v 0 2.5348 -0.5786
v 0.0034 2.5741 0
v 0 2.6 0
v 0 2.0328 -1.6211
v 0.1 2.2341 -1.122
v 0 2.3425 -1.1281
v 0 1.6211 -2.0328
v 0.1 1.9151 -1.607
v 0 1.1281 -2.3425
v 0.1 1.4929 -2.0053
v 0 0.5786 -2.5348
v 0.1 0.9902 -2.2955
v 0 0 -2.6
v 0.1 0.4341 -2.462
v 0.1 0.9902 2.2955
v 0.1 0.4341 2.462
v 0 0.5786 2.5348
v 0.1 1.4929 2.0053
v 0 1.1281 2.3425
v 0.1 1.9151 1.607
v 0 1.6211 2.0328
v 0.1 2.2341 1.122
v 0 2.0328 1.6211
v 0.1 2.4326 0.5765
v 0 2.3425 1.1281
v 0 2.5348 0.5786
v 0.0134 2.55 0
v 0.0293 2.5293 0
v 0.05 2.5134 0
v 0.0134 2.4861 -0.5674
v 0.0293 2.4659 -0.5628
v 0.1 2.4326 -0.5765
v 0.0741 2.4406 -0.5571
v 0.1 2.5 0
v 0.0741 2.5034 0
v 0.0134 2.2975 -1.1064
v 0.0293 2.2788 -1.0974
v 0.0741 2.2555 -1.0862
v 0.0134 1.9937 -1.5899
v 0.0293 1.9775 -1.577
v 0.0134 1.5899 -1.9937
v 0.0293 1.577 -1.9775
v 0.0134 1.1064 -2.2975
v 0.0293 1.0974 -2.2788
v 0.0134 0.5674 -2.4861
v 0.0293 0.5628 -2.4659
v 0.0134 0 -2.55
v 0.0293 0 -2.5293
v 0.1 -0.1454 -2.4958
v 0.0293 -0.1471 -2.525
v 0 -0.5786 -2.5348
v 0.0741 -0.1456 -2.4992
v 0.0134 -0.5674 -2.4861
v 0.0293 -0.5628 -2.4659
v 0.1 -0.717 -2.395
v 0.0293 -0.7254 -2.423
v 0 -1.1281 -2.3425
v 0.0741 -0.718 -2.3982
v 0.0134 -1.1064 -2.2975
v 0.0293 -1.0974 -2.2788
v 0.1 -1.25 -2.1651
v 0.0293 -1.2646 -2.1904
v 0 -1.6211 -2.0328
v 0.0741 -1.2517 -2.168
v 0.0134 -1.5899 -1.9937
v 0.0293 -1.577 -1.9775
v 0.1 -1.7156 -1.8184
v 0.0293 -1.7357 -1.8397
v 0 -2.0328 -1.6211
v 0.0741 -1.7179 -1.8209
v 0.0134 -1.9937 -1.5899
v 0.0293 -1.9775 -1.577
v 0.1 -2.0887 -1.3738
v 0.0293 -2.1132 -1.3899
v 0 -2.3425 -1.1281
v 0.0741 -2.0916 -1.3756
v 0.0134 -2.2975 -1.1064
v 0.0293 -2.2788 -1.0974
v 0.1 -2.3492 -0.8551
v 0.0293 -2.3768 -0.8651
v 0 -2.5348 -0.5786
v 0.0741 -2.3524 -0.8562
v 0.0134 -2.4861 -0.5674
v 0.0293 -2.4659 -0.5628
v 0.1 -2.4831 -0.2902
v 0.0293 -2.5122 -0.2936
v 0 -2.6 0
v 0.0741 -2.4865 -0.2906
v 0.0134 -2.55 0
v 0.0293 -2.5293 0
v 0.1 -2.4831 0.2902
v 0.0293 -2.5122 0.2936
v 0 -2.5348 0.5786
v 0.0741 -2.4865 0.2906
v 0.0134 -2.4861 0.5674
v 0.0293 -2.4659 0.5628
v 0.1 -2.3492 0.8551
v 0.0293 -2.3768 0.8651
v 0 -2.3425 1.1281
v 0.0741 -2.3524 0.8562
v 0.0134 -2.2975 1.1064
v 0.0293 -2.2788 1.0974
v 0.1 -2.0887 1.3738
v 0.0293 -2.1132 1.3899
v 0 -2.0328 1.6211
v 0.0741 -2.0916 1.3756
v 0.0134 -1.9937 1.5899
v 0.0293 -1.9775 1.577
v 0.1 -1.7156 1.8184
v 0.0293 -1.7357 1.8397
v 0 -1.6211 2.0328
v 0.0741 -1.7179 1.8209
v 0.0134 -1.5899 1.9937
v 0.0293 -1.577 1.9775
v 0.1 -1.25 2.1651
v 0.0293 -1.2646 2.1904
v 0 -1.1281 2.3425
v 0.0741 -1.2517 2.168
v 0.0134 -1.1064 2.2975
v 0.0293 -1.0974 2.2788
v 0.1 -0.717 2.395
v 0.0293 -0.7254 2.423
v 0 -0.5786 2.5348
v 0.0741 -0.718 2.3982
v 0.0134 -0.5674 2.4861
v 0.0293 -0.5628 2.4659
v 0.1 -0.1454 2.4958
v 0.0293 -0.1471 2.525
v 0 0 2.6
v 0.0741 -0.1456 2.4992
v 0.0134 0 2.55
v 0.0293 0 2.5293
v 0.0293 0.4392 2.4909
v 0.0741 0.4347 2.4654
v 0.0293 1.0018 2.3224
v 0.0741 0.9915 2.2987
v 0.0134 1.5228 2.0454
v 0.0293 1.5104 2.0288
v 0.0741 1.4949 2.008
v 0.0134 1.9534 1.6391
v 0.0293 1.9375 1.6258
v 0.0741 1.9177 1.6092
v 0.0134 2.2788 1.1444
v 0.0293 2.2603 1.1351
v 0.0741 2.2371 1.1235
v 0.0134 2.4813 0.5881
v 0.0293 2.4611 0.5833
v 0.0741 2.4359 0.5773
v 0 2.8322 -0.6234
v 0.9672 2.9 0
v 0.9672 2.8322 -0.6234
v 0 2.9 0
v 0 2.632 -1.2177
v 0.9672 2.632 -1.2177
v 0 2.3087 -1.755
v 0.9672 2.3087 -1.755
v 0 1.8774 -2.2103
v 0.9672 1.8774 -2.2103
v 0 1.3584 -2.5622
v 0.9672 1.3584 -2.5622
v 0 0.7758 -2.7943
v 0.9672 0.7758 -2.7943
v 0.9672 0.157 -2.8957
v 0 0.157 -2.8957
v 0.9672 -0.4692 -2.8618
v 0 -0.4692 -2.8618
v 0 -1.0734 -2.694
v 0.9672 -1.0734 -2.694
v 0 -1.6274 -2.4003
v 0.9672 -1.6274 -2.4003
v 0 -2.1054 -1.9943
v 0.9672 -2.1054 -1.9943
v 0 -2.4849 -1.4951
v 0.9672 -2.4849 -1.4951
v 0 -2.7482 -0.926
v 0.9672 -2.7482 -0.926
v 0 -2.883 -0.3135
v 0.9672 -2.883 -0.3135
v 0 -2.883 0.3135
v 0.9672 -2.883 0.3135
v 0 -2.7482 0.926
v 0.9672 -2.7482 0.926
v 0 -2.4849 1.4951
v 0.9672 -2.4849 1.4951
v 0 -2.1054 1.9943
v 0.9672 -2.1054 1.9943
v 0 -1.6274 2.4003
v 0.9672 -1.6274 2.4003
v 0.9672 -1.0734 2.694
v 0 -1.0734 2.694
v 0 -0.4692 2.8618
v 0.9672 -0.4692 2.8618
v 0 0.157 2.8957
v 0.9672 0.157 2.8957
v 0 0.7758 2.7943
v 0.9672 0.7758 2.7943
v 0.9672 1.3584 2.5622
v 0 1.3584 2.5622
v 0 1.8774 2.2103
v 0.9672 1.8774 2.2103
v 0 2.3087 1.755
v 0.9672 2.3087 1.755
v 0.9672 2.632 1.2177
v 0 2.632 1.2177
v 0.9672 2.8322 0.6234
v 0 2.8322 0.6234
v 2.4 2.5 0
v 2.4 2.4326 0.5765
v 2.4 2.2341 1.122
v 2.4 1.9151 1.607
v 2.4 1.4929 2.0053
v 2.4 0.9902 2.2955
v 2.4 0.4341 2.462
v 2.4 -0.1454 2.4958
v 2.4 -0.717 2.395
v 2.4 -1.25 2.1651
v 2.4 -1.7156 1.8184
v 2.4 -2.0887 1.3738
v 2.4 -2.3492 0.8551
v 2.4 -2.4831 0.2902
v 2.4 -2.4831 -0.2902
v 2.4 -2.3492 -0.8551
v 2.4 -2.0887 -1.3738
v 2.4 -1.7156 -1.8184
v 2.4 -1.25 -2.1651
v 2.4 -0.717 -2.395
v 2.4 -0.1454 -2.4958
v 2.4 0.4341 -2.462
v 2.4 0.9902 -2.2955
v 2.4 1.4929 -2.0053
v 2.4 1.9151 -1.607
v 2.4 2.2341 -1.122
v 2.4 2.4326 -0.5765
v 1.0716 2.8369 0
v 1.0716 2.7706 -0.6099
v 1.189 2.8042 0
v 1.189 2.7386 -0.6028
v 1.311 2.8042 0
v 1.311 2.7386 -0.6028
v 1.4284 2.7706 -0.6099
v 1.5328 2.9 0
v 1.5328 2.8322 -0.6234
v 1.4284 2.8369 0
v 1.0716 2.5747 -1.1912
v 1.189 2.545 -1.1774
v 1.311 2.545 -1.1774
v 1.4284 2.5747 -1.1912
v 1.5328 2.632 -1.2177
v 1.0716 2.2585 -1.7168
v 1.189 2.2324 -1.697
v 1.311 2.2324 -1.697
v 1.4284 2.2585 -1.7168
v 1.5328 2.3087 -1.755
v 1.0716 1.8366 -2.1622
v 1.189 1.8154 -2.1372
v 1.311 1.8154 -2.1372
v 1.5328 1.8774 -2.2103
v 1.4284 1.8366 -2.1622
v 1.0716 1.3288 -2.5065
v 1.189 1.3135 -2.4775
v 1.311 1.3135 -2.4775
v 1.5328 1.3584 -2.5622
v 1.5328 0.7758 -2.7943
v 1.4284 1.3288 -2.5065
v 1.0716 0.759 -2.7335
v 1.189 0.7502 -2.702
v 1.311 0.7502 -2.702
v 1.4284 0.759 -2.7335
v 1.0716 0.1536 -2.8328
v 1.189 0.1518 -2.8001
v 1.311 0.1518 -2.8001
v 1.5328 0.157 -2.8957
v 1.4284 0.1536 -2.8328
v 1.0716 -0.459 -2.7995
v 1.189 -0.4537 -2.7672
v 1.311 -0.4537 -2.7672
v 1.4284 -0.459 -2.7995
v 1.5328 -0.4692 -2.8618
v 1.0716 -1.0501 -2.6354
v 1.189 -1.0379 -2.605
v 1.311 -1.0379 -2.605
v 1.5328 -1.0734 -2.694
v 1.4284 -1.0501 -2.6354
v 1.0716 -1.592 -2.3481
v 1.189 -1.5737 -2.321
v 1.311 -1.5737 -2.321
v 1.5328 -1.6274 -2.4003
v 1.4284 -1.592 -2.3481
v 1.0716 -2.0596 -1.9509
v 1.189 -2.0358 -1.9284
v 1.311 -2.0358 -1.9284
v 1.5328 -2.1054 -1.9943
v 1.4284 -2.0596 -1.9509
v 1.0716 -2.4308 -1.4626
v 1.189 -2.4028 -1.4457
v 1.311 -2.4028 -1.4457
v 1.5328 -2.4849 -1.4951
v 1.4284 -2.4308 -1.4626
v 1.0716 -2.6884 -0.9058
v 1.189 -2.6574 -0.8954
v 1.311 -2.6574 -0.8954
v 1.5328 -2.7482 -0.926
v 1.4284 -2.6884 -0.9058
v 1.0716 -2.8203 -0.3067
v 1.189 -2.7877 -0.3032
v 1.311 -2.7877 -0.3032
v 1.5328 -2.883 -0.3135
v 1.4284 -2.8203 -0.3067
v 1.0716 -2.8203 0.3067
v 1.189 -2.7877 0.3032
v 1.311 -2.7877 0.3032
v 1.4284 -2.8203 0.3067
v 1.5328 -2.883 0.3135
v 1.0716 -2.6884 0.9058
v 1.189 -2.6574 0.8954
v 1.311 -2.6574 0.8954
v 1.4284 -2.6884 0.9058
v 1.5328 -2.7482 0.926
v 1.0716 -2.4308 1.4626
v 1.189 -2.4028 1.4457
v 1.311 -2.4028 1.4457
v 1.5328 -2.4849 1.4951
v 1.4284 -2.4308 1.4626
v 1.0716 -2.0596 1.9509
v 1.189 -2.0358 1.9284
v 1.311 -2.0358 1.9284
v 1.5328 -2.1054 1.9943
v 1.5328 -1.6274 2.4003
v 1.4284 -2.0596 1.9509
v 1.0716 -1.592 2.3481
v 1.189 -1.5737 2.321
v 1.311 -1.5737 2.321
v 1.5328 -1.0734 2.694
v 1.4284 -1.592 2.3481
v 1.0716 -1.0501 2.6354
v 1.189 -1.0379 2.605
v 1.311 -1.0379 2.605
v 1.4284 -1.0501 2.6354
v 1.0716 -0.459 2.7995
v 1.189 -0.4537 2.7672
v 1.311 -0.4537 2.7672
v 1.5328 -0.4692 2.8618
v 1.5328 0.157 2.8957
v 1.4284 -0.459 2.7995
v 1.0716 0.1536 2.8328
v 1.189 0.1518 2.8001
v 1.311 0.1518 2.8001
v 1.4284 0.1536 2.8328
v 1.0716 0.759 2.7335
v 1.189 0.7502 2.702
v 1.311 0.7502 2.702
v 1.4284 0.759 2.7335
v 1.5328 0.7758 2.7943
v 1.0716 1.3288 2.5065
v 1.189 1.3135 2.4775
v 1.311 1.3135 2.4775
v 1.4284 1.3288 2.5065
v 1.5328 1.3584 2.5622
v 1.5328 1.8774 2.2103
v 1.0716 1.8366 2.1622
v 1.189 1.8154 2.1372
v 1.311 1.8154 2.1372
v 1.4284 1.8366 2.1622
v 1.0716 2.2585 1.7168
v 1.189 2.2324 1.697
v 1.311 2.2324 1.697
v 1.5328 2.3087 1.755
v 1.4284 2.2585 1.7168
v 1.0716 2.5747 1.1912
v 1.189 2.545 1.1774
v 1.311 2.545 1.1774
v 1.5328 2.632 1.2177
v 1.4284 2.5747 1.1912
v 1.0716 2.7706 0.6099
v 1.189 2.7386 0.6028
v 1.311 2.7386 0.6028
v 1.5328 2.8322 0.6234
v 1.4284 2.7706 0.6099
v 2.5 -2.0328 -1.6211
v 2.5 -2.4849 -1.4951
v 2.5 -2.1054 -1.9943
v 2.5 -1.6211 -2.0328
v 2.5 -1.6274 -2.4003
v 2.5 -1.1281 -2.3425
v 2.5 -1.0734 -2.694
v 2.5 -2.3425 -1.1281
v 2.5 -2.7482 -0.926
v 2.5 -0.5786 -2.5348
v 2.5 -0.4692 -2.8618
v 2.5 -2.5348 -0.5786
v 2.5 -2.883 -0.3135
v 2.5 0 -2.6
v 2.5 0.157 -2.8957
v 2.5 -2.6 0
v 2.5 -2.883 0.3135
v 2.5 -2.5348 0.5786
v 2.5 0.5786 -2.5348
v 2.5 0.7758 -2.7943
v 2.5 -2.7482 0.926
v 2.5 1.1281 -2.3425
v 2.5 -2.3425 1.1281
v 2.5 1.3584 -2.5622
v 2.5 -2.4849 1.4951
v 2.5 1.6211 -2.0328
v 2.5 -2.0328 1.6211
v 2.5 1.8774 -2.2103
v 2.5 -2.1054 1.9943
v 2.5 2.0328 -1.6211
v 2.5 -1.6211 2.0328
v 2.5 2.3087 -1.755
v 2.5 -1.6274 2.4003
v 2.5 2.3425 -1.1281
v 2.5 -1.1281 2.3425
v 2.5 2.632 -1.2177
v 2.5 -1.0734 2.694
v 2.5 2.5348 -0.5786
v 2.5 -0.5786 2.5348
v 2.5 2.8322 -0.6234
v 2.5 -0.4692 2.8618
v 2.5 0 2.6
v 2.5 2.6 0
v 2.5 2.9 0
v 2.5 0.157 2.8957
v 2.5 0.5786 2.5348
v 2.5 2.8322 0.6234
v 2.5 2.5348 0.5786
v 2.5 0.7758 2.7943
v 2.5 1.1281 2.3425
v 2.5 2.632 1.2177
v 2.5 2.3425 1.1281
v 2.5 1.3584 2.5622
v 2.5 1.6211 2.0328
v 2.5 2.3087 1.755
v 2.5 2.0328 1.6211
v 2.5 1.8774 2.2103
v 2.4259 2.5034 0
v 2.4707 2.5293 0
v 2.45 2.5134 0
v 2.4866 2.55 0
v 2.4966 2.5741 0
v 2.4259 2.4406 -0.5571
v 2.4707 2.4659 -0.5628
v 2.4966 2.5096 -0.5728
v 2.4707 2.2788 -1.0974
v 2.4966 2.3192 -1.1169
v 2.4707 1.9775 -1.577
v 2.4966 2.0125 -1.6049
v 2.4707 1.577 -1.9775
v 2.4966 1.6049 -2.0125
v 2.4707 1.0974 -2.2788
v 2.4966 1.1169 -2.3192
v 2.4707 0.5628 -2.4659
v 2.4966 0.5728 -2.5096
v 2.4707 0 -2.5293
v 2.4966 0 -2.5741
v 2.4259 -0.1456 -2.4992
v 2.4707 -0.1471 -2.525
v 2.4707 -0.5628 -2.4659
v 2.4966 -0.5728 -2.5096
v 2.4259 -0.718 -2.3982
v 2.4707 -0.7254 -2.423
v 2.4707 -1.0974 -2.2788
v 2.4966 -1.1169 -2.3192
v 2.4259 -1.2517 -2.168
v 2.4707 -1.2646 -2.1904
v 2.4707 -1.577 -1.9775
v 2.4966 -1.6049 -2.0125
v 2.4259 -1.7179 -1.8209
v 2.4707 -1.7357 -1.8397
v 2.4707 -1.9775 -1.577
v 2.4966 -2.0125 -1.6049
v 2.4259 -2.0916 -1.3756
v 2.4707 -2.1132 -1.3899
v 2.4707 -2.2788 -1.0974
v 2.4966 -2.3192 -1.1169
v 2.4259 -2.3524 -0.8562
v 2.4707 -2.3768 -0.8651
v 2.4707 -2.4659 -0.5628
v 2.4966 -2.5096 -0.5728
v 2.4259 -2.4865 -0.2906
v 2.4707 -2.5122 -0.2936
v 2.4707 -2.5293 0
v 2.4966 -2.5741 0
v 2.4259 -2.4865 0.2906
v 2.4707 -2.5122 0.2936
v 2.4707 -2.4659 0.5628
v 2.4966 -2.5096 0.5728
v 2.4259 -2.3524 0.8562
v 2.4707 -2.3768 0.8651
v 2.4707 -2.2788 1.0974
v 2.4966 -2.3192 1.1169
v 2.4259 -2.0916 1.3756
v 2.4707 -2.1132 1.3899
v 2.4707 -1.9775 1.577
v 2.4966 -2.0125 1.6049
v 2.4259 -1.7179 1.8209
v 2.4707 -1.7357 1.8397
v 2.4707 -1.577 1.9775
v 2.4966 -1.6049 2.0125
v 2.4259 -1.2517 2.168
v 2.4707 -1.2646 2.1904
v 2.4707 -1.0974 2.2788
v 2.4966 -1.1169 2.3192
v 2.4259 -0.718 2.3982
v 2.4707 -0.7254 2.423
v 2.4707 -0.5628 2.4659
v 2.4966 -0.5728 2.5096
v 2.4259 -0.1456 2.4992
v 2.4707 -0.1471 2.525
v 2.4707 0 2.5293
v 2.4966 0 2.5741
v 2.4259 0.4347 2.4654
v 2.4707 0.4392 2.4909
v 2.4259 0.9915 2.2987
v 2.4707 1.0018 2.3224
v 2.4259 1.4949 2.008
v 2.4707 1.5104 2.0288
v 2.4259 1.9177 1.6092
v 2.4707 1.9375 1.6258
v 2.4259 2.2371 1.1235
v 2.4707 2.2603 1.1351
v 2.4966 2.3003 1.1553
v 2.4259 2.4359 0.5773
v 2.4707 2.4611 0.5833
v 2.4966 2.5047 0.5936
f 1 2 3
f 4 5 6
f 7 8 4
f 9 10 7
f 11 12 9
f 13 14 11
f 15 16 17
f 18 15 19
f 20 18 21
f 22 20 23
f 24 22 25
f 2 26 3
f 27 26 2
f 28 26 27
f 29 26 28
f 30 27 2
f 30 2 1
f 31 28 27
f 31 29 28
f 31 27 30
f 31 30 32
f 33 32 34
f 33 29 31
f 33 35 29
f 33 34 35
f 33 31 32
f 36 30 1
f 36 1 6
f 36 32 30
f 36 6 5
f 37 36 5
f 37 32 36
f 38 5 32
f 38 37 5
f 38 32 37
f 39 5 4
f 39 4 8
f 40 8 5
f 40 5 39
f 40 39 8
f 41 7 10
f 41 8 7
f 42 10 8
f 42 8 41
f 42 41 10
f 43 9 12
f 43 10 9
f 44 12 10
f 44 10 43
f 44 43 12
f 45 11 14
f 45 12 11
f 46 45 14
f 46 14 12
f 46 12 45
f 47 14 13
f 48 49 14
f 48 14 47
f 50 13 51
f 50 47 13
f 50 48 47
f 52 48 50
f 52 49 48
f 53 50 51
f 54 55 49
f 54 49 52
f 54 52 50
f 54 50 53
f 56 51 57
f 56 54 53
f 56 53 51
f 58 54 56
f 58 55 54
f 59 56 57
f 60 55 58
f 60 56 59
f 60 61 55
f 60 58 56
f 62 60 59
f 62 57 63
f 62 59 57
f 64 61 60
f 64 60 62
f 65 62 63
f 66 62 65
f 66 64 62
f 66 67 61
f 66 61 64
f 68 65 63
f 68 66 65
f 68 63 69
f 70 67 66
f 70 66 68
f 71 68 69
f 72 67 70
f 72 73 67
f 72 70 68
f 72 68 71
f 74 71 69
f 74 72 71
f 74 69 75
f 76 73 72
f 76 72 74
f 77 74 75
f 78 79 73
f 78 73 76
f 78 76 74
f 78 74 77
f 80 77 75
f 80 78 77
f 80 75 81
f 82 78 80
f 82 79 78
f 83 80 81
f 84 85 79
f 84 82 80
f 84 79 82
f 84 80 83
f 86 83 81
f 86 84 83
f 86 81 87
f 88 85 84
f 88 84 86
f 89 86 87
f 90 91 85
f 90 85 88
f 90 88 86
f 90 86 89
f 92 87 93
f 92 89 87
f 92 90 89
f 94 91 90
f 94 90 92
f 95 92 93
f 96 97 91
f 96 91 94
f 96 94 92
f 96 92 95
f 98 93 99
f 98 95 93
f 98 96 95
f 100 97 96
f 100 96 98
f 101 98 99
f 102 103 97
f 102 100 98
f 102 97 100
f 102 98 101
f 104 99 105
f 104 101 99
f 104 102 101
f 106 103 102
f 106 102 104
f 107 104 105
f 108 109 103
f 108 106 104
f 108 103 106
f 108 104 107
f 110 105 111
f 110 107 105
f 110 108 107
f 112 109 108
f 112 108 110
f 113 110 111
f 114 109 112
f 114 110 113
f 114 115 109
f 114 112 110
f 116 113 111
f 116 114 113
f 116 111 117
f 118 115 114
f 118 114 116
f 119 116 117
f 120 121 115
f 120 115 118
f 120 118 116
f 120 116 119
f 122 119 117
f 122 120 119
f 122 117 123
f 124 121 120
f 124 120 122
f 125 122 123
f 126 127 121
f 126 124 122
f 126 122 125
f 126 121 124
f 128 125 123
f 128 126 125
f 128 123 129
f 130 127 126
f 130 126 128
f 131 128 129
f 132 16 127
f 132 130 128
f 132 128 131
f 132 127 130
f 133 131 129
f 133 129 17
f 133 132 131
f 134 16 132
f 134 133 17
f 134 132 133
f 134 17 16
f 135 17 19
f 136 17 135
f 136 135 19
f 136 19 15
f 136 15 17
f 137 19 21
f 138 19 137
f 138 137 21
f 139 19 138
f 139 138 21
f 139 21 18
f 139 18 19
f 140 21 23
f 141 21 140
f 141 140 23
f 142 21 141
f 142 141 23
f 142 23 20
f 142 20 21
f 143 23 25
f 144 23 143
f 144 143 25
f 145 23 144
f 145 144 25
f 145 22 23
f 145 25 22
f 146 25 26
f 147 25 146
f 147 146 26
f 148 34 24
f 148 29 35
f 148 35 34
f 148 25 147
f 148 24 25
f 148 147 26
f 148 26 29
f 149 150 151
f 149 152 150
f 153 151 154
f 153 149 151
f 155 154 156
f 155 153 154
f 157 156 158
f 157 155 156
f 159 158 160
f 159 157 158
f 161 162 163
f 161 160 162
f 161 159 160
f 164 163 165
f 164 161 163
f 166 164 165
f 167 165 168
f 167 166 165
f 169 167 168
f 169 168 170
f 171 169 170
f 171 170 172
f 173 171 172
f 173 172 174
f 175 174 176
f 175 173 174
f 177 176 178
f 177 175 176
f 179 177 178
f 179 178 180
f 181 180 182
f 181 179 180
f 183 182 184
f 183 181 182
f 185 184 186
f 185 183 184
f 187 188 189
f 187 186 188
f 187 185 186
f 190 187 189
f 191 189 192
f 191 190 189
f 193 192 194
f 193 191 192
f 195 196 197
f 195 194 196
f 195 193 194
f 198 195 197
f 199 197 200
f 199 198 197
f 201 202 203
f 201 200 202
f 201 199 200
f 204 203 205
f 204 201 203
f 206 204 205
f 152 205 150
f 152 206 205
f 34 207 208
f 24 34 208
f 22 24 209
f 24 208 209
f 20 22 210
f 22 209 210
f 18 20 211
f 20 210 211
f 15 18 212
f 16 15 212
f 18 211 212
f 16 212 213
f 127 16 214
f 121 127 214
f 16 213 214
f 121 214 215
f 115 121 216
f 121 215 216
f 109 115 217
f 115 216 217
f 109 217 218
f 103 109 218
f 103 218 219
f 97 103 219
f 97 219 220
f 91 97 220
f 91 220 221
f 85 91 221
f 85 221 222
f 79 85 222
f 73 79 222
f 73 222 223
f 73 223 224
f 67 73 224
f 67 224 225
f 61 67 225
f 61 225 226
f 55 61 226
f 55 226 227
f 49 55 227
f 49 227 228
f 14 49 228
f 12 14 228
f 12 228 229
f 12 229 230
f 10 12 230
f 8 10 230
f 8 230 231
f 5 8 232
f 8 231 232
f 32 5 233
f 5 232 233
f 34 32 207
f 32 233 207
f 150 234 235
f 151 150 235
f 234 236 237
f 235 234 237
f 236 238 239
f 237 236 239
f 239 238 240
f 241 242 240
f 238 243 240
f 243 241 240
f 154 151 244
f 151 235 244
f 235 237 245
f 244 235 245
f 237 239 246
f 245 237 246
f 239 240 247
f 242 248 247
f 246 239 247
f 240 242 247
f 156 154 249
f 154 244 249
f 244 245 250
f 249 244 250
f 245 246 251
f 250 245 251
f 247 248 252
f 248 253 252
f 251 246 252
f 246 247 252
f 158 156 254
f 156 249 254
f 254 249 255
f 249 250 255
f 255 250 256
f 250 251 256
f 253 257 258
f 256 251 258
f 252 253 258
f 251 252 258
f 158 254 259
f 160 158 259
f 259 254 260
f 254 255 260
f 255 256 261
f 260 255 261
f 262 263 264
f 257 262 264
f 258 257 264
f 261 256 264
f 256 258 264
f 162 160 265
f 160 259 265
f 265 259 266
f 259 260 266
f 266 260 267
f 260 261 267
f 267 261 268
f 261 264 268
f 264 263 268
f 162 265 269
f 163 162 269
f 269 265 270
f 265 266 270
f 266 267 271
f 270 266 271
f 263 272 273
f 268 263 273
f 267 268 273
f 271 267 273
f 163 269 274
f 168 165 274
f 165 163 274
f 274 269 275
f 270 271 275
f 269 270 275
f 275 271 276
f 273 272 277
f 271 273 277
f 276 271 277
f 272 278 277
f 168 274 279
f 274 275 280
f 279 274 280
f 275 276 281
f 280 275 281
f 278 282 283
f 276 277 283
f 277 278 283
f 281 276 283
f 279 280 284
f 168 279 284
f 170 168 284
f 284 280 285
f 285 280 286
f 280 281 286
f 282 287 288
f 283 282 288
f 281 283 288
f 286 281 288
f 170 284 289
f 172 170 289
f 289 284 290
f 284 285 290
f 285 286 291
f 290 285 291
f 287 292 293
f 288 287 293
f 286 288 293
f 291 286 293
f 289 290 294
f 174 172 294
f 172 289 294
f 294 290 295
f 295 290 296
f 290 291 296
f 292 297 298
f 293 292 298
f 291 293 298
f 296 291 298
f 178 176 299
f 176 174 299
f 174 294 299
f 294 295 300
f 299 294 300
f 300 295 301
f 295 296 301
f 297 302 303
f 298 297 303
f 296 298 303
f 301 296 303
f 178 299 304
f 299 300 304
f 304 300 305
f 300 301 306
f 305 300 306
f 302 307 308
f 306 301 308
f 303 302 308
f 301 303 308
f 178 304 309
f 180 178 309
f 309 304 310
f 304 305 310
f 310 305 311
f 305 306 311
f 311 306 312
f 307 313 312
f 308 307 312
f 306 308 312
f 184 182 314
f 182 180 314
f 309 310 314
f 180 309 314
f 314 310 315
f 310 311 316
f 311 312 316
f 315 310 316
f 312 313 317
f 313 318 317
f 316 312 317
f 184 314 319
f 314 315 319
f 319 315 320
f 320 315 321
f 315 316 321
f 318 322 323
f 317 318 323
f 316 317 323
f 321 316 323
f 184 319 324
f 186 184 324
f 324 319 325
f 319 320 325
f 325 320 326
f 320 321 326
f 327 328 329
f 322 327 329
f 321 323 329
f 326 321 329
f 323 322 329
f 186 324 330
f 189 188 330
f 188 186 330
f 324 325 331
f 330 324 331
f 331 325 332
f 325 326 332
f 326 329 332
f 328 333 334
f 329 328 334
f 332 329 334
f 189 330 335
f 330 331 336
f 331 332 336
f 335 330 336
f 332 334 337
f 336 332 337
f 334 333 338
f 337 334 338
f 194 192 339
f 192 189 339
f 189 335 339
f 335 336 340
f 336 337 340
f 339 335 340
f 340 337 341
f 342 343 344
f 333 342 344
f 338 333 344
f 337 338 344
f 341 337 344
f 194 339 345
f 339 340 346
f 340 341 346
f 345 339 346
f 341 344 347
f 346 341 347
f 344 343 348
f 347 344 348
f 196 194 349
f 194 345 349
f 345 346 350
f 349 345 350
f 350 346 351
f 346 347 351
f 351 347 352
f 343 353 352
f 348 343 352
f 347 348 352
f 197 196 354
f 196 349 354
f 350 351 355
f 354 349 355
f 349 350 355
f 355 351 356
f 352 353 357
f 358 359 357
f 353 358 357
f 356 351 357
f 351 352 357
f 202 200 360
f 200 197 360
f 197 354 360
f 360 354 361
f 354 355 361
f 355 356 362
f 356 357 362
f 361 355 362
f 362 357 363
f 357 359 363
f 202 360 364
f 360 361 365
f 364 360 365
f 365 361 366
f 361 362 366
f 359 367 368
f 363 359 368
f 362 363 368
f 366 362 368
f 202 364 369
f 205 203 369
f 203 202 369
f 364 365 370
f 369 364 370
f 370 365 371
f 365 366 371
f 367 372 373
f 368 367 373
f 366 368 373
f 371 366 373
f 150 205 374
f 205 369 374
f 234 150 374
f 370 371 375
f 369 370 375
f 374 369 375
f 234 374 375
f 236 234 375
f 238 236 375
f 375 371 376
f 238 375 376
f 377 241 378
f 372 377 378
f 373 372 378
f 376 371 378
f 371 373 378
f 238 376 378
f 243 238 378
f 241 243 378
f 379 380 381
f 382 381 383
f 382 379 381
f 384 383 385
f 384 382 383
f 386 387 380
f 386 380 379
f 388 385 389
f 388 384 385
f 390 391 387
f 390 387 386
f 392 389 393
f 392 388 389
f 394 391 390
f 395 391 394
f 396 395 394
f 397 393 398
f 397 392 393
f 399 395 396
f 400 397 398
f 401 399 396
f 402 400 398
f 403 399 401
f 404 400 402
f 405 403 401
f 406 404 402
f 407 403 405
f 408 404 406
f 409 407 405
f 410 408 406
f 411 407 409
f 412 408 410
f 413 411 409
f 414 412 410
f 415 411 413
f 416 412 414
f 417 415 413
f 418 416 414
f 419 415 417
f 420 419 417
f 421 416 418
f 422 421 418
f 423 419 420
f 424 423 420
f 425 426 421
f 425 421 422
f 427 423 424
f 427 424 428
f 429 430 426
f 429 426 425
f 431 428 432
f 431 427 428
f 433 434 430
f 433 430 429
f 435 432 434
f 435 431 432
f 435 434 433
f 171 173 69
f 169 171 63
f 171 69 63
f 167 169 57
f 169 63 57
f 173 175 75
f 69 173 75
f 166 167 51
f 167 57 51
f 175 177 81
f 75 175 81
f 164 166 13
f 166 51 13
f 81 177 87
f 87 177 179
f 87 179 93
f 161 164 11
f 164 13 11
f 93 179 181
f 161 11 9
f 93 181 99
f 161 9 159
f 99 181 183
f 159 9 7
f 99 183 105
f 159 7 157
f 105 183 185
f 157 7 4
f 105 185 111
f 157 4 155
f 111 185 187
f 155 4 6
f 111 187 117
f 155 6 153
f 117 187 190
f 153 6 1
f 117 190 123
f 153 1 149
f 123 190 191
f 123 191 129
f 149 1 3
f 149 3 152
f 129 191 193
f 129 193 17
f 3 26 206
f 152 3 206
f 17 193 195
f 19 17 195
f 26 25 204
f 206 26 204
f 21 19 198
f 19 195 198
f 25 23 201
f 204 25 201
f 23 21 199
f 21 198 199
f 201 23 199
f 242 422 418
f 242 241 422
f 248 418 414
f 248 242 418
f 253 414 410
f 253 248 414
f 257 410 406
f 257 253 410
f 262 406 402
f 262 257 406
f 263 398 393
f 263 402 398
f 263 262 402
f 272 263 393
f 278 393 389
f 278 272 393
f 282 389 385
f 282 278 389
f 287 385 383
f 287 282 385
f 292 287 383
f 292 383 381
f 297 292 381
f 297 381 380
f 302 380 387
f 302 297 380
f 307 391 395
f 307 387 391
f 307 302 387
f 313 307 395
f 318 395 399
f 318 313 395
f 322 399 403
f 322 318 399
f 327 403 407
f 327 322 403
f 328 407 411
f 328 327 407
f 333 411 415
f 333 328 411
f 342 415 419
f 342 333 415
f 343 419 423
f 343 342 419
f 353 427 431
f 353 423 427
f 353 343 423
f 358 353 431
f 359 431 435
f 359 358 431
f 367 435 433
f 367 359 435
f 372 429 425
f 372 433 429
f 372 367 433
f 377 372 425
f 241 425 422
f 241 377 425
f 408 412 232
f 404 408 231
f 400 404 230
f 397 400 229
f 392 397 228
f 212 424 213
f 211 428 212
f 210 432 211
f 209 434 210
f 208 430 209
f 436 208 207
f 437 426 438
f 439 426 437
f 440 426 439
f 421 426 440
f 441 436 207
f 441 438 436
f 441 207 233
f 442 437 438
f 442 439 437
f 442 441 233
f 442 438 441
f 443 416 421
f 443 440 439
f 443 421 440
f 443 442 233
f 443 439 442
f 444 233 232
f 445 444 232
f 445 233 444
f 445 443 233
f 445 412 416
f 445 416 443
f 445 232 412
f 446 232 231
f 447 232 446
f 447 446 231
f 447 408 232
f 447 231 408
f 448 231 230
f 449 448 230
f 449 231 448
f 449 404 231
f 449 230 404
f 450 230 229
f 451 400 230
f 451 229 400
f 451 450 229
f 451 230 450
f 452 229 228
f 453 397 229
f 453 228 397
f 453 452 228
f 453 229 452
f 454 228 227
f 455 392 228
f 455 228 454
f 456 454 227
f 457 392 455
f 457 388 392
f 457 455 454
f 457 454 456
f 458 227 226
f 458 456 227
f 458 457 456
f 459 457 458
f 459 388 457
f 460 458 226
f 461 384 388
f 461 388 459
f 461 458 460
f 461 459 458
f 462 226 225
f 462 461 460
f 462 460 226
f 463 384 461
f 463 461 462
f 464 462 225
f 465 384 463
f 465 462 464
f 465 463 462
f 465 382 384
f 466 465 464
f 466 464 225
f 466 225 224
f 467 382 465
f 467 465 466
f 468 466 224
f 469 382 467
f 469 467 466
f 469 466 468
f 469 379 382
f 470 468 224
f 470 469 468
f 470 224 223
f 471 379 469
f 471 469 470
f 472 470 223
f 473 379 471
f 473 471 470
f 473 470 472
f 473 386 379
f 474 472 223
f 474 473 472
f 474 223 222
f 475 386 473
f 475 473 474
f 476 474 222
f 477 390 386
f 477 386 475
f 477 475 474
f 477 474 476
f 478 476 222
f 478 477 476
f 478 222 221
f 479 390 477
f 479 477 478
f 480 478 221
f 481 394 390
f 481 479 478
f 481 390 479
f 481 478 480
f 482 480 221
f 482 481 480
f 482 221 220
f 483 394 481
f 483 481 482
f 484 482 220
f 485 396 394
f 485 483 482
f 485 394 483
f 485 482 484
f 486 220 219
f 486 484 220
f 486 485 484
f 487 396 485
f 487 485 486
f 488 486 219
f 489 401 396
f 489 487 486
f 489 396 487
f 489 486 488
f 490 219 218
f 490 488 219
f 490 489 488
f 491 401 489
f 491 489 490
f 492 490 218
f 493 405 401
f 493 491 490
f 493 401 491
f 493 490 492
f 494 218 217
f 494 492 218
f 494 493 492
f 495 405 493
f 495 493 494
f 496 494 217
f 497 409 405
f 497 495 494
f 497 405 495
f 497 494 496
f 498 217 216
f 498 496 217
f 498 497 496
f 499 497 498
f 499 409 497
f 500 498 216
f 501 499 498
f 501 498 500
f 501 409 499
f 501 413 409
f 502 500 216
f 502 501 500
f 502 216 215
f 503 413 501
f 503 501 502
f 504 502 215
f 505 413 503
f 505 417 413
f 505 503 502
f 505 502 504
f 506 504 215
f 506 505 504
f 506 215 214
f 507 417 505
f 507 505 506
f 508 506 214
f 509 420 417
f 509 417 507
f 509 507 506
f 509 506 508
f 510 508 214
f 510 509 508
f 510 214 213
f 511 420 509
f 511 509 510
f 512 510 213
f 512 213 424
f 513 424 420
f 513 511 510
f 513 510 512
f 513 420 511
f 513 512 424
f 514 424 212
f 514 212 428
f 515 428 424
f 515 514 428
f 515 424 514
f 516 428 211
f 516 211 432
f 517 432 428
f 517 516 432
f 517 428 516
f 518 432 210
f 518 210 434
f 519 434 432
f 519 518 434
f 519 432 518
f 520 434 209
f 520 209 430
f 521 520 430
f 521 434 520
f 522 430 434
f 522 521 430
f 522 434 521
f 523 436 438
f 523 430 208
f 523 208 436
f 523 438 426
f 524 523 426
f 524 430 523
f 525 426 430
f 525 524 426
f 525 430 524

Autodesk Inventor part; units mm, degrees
sketch "Sketch_1" plane through (0, 0, 0) normal (0, 0, 1) x (1, 0, 0)
  line L0 (2.5, 0) -> (0, 0)
  arc A0 (0, 2.6) -> (0.1, 2.5) centre (0.1, 2.6) ccw
  line L1 (0.1, 2.5) -> (2.4, 2.5)
  arc A1 (2.4, 2.5) -> (2.5, 2.6) centre (2.4, 2.6) ccw
  line L2 (2.5, 2.6) -> (2.5, 2.9)
  line L3 (2.5, 2.9) -> (1.5328, 2.9)
  arc A2 (0.9672, 2.9) -> (1.5328, 2.9) centre (1.25, 3.25) ccw
  line L4 (0.9672, 2.9) -> (0, 2.9)
  line L5 (0, 2.9) -> (0, 2.6)
revolve "Revolution1" add sketch "Sketch_1" angle 360 about axis through (2.5, 0, 0) along (1, 0, 0)
ref_plane "ip_st_1_1_XY" through (1.25, 3.25, 0) normal (1, 0, 0) x (0, 0, -1)
ref_plane "ip_st_1_1_YZ" through (1.25, 3.25, 0) normal (0, 0, -1) x (0, 1, 0)
ref_plane "ip_st_1_1_ZX" through (1.25, 3.25, 0) normal (0, 1, 0) x (1, 0, 0)
ref_plane "ip_st_1_10_XY" through (1.25, -3.1947, -0.5972) normal (1, 0, 0) x (0, 0, -1)
ref_plane "ip_st_1_10_YZ" through (1.25, -3.1947, -0.5972) normal (0, 0, -1) x (0, 1, 0)
ref_plane "ip_st_1_10_ZX" through (1.25, -3.1947, -0.5972) normal (0, 1, 0) x (1, 0, 0)
ref_plane "ip_st_1_11_XY" through (1.25, -2.7632, -1.7109) normal (1, 0, 0) x (0, 0, -1)
ref_plane "ip_st_1_11_YZ" through (1.25, -2.7632, -1.7109) normal (0, 0, -1) x (0, 1, 0)
ref_plane "ip_st_1_11_ZX" through (1.25, -2.7632, -1.7109) normal (0, 1, 0) x (1, 0, 0)
ref_plane "ip_st_1_12_XY" through (1.25, -1.9586, -2.5936) normal (1, 0, 0) x (0, 0, -1)
ref_plane "ip_st_1_12_YZ" through (1.25, -1.9586, -2.5936) normal (0, 0, -1) x (0, 1, 0)
ref_plane "ip_st_1_12_ZX" through (1.25, -1.9586, -2.5936) normal (0, 1, 0) x (1, 0, 0)
ref_plane "ip_st_1_13_XY" through (1.25, -0.8894, -3.1259) normal (1, 0, 0) x (0, 0, -1)
ref_plane "ip_st_1_13_YZ" through (1.25, -0.8894, -3.1259) normal (0, 0, -1) x (0, 1, 0)
ref_plane "ip_st_1_13_ZX" through (1.25, -0.8894, -3.1259) normal (0, 1, 0) x (1, 0, 0)
ref_plane "ip_st_1_14_XY" through (1.25, 0.2999, -3.2361) normal (1, 0, 0) x (0, 0, -1)
ref_plane "ip_st_1_14_YZ" through (1.25, 0.2999, -3.2361) normal (0, 0, -1) x (0, 1, 0)
ref_plane "ip_st_1_14_ZX" through (1.25, 0.2999, -3.2361) normal (0, 1, 0) x (1, 0, 0)
ref_plane "ip_st_1_15_XY" through (1.25, 1.4486, -2.9093) normal (1, 0, 0) x (0, 0, -1)
ref_plane "ip_st_1_15_YZ" through (1.25, 1.4486, -2.9093) normal (0, 0, -1) x (0, 1, 0)
ref_plane "ip_st_1_15_ZX" through (1.25, 1.4486, -2.9093) normal (0, 1, 0) x (1, 0, 0)
ref_plane "ip_st_1_16_XY" through (1.25, 2.4018, -2.1895) normal (1, 0, 0) x (0, 0, -1)
ref_plane "ip_st_1_16_YZ" through (1.25, 2.4018, -2.1895) normal (0, 0, -1) x (0, 1, 0)
ref_plane "ip_st_1_16_ZX" through (1.25, 2.4018, -2.1895) normal (0, 1, 0) x (1, 0, 0)
ref_plane "ip_st_1_17_XY" through (1.25, 3.0305, -1.174) normal (1, 0, 0) x (0, 0, -1)
ref_plane "ip_st_1_17_YZ" through (1.25, 3.0305, -1.174) normal (0, 0, -1) x (0, 1, 0)
ref_plane "ip_st_1_17_ZX" through (1.25, 3.0305, -1.174) normal (0, 1, 0) x (1, 0, 0)
ref_plane "ip_st_1_2_XY" through (1.25, 3.0305, 1.174) normal (1, 0, 0) x (0, 0, -1)
ref_plane "ip_st_1_2_YZ" through (1.25, 3.0305, 1.174) normal (0, 0, -1) x (0, 1, 0)
ref_plane "ip_st_1_2_ZX" through (1.25, 3.0305, 1.174) normal (0, 1, 0) x (1, 0, 0)
ref_plane "ip_st_1_3_XY" through (1.25, 2.4018, 2.1895) normal (1, 0, 0) x (0, 0, -1)
ref_plane "ip_st_1_3_YZ" through (1.25, 2.4018, 2.1895) normal (0, 0, -1) x (0, 1, 0)
ref_plane "ip_st_1_3_ZX" through (1.25, 2.4018, 2.1895) normal (0, 1, 0) x (1, 0, 0)
ref_plane "ip_st_1_4_XY" through (1.25, 1.4486, 2.9093) normal (1, 0, 0) x (0, 0, -1)
ref_plane "ip_st_1_4_YZ" through (1.25, 1.4486, 2.9093) normal (0, 0, -1) x (0, 1, 0)
ref_plane "ip_st_1_4_ZX" through (1.25, 1.4486, 2.9093) normal (0, 1, 0) x (1, 0, 0)
ref_plane "ip_st_1_5_XY" through (1.25, 0.2999, 3.2361) normal (1, 0, 0) x (0, 0, -1)
ref_plane "ip_st_1_5_YZ" through (1.25, 0.2999, 3.2361) normal (0, 0, -1) x (0, 1, 0)
ref_plane "ip_st_1_5_ZX" through (1.25, 0.2999, 3.2361) normal (0, 1, 0) x (1, 0, 0)
ref_plane "ip_st_1_6_XY" through (1.25, -0.8894, 3.1259) normal (1, 0, 0) x (0, 0, -1)
ref_plane "ip_st_1_6_YZ" through (1.25, -0.8894, 3.1259) normal (0, 0, -1) x (0, 1, 0)
ref_plane "ip_st_1_6_ZX" through (1.25, -0.8894, 3.1259) normal (0, 1, 0) x (1, 0, 0)
ref_plane "ip_st_1_7_XY" through (1.25, -1.9586, 2.5936) normal (1, 0, 0) x (0, 0, -1)
ref_plane "ip_st_1_7_YZ" through (1.25, -1.9586, 2.5936) normal (0, 0, -1) x (0, 1, 0)
ref_plane "ip_st_1_7_ZX" through (1.25, -1.9586, 2.5936) normal (0, 1, 0) x (1, 0, 0)
ref_plane "ip_st_1_8_XY" through (1.25, -2.7632, 1.7109) normal (1, 0, 0) x (0, 0, -1)
ref_plane "ip_st_1_8_YZ" through (1.25, -2.7632, 1.7109) normal (0, 0, -1) x (0, 1, 0)
ref_plane "ip_st_1_8_ZX" through (1.25, -2.7632, 1.7109) normal (0, 1, 0) x (1, 0, 0)
ref_plane "ip_st_1_9_XY" through (1.25, -3.1947, 0.5972) normal (1, 0, 0) x (0, 0, -1)
ref_plane "ip_st_1_9_YZ" through (1.25, -3.1947, 0.5972) normal (0, 0, -1) x (0, 1, 0)
ref_plane "ip_st_1_9_ZX" through (1.25, -3.1947, 0.5972) normal (0, 1, 0) x (1, 0, 0)
ref_plane "ip_st_1a_XY" through (0, 0, 0) normal (1, 0, 0) x (0, 0, -1)
ref_plane "ip_st_1a_YZ" through (0, 0, 0) normal (0, 0, -1) x (0, 1, 0)
ref_plane "ip_st_1a_ZX" through (0, 0, 0) normal (0, 1, 0) x (1, 0, 0)
ref_plane "ip_st_2a_XY" through (0.1562, 0, 0) normal (1, 0, 0) x (0, 0, -1)
ref_plane "ip_st_2a_YZ" through (0.1562, 0, 0) normal (0, 0, -1) x (0, 1, 0)
ref_plane "ip_st_2a_ZX" through (0.1562, 0, 0) normal (0, 1, 0) x (1, 0, 0)
properties part number "MF85ZZ Inner Ring" material "ステンレス鋼 440C"
